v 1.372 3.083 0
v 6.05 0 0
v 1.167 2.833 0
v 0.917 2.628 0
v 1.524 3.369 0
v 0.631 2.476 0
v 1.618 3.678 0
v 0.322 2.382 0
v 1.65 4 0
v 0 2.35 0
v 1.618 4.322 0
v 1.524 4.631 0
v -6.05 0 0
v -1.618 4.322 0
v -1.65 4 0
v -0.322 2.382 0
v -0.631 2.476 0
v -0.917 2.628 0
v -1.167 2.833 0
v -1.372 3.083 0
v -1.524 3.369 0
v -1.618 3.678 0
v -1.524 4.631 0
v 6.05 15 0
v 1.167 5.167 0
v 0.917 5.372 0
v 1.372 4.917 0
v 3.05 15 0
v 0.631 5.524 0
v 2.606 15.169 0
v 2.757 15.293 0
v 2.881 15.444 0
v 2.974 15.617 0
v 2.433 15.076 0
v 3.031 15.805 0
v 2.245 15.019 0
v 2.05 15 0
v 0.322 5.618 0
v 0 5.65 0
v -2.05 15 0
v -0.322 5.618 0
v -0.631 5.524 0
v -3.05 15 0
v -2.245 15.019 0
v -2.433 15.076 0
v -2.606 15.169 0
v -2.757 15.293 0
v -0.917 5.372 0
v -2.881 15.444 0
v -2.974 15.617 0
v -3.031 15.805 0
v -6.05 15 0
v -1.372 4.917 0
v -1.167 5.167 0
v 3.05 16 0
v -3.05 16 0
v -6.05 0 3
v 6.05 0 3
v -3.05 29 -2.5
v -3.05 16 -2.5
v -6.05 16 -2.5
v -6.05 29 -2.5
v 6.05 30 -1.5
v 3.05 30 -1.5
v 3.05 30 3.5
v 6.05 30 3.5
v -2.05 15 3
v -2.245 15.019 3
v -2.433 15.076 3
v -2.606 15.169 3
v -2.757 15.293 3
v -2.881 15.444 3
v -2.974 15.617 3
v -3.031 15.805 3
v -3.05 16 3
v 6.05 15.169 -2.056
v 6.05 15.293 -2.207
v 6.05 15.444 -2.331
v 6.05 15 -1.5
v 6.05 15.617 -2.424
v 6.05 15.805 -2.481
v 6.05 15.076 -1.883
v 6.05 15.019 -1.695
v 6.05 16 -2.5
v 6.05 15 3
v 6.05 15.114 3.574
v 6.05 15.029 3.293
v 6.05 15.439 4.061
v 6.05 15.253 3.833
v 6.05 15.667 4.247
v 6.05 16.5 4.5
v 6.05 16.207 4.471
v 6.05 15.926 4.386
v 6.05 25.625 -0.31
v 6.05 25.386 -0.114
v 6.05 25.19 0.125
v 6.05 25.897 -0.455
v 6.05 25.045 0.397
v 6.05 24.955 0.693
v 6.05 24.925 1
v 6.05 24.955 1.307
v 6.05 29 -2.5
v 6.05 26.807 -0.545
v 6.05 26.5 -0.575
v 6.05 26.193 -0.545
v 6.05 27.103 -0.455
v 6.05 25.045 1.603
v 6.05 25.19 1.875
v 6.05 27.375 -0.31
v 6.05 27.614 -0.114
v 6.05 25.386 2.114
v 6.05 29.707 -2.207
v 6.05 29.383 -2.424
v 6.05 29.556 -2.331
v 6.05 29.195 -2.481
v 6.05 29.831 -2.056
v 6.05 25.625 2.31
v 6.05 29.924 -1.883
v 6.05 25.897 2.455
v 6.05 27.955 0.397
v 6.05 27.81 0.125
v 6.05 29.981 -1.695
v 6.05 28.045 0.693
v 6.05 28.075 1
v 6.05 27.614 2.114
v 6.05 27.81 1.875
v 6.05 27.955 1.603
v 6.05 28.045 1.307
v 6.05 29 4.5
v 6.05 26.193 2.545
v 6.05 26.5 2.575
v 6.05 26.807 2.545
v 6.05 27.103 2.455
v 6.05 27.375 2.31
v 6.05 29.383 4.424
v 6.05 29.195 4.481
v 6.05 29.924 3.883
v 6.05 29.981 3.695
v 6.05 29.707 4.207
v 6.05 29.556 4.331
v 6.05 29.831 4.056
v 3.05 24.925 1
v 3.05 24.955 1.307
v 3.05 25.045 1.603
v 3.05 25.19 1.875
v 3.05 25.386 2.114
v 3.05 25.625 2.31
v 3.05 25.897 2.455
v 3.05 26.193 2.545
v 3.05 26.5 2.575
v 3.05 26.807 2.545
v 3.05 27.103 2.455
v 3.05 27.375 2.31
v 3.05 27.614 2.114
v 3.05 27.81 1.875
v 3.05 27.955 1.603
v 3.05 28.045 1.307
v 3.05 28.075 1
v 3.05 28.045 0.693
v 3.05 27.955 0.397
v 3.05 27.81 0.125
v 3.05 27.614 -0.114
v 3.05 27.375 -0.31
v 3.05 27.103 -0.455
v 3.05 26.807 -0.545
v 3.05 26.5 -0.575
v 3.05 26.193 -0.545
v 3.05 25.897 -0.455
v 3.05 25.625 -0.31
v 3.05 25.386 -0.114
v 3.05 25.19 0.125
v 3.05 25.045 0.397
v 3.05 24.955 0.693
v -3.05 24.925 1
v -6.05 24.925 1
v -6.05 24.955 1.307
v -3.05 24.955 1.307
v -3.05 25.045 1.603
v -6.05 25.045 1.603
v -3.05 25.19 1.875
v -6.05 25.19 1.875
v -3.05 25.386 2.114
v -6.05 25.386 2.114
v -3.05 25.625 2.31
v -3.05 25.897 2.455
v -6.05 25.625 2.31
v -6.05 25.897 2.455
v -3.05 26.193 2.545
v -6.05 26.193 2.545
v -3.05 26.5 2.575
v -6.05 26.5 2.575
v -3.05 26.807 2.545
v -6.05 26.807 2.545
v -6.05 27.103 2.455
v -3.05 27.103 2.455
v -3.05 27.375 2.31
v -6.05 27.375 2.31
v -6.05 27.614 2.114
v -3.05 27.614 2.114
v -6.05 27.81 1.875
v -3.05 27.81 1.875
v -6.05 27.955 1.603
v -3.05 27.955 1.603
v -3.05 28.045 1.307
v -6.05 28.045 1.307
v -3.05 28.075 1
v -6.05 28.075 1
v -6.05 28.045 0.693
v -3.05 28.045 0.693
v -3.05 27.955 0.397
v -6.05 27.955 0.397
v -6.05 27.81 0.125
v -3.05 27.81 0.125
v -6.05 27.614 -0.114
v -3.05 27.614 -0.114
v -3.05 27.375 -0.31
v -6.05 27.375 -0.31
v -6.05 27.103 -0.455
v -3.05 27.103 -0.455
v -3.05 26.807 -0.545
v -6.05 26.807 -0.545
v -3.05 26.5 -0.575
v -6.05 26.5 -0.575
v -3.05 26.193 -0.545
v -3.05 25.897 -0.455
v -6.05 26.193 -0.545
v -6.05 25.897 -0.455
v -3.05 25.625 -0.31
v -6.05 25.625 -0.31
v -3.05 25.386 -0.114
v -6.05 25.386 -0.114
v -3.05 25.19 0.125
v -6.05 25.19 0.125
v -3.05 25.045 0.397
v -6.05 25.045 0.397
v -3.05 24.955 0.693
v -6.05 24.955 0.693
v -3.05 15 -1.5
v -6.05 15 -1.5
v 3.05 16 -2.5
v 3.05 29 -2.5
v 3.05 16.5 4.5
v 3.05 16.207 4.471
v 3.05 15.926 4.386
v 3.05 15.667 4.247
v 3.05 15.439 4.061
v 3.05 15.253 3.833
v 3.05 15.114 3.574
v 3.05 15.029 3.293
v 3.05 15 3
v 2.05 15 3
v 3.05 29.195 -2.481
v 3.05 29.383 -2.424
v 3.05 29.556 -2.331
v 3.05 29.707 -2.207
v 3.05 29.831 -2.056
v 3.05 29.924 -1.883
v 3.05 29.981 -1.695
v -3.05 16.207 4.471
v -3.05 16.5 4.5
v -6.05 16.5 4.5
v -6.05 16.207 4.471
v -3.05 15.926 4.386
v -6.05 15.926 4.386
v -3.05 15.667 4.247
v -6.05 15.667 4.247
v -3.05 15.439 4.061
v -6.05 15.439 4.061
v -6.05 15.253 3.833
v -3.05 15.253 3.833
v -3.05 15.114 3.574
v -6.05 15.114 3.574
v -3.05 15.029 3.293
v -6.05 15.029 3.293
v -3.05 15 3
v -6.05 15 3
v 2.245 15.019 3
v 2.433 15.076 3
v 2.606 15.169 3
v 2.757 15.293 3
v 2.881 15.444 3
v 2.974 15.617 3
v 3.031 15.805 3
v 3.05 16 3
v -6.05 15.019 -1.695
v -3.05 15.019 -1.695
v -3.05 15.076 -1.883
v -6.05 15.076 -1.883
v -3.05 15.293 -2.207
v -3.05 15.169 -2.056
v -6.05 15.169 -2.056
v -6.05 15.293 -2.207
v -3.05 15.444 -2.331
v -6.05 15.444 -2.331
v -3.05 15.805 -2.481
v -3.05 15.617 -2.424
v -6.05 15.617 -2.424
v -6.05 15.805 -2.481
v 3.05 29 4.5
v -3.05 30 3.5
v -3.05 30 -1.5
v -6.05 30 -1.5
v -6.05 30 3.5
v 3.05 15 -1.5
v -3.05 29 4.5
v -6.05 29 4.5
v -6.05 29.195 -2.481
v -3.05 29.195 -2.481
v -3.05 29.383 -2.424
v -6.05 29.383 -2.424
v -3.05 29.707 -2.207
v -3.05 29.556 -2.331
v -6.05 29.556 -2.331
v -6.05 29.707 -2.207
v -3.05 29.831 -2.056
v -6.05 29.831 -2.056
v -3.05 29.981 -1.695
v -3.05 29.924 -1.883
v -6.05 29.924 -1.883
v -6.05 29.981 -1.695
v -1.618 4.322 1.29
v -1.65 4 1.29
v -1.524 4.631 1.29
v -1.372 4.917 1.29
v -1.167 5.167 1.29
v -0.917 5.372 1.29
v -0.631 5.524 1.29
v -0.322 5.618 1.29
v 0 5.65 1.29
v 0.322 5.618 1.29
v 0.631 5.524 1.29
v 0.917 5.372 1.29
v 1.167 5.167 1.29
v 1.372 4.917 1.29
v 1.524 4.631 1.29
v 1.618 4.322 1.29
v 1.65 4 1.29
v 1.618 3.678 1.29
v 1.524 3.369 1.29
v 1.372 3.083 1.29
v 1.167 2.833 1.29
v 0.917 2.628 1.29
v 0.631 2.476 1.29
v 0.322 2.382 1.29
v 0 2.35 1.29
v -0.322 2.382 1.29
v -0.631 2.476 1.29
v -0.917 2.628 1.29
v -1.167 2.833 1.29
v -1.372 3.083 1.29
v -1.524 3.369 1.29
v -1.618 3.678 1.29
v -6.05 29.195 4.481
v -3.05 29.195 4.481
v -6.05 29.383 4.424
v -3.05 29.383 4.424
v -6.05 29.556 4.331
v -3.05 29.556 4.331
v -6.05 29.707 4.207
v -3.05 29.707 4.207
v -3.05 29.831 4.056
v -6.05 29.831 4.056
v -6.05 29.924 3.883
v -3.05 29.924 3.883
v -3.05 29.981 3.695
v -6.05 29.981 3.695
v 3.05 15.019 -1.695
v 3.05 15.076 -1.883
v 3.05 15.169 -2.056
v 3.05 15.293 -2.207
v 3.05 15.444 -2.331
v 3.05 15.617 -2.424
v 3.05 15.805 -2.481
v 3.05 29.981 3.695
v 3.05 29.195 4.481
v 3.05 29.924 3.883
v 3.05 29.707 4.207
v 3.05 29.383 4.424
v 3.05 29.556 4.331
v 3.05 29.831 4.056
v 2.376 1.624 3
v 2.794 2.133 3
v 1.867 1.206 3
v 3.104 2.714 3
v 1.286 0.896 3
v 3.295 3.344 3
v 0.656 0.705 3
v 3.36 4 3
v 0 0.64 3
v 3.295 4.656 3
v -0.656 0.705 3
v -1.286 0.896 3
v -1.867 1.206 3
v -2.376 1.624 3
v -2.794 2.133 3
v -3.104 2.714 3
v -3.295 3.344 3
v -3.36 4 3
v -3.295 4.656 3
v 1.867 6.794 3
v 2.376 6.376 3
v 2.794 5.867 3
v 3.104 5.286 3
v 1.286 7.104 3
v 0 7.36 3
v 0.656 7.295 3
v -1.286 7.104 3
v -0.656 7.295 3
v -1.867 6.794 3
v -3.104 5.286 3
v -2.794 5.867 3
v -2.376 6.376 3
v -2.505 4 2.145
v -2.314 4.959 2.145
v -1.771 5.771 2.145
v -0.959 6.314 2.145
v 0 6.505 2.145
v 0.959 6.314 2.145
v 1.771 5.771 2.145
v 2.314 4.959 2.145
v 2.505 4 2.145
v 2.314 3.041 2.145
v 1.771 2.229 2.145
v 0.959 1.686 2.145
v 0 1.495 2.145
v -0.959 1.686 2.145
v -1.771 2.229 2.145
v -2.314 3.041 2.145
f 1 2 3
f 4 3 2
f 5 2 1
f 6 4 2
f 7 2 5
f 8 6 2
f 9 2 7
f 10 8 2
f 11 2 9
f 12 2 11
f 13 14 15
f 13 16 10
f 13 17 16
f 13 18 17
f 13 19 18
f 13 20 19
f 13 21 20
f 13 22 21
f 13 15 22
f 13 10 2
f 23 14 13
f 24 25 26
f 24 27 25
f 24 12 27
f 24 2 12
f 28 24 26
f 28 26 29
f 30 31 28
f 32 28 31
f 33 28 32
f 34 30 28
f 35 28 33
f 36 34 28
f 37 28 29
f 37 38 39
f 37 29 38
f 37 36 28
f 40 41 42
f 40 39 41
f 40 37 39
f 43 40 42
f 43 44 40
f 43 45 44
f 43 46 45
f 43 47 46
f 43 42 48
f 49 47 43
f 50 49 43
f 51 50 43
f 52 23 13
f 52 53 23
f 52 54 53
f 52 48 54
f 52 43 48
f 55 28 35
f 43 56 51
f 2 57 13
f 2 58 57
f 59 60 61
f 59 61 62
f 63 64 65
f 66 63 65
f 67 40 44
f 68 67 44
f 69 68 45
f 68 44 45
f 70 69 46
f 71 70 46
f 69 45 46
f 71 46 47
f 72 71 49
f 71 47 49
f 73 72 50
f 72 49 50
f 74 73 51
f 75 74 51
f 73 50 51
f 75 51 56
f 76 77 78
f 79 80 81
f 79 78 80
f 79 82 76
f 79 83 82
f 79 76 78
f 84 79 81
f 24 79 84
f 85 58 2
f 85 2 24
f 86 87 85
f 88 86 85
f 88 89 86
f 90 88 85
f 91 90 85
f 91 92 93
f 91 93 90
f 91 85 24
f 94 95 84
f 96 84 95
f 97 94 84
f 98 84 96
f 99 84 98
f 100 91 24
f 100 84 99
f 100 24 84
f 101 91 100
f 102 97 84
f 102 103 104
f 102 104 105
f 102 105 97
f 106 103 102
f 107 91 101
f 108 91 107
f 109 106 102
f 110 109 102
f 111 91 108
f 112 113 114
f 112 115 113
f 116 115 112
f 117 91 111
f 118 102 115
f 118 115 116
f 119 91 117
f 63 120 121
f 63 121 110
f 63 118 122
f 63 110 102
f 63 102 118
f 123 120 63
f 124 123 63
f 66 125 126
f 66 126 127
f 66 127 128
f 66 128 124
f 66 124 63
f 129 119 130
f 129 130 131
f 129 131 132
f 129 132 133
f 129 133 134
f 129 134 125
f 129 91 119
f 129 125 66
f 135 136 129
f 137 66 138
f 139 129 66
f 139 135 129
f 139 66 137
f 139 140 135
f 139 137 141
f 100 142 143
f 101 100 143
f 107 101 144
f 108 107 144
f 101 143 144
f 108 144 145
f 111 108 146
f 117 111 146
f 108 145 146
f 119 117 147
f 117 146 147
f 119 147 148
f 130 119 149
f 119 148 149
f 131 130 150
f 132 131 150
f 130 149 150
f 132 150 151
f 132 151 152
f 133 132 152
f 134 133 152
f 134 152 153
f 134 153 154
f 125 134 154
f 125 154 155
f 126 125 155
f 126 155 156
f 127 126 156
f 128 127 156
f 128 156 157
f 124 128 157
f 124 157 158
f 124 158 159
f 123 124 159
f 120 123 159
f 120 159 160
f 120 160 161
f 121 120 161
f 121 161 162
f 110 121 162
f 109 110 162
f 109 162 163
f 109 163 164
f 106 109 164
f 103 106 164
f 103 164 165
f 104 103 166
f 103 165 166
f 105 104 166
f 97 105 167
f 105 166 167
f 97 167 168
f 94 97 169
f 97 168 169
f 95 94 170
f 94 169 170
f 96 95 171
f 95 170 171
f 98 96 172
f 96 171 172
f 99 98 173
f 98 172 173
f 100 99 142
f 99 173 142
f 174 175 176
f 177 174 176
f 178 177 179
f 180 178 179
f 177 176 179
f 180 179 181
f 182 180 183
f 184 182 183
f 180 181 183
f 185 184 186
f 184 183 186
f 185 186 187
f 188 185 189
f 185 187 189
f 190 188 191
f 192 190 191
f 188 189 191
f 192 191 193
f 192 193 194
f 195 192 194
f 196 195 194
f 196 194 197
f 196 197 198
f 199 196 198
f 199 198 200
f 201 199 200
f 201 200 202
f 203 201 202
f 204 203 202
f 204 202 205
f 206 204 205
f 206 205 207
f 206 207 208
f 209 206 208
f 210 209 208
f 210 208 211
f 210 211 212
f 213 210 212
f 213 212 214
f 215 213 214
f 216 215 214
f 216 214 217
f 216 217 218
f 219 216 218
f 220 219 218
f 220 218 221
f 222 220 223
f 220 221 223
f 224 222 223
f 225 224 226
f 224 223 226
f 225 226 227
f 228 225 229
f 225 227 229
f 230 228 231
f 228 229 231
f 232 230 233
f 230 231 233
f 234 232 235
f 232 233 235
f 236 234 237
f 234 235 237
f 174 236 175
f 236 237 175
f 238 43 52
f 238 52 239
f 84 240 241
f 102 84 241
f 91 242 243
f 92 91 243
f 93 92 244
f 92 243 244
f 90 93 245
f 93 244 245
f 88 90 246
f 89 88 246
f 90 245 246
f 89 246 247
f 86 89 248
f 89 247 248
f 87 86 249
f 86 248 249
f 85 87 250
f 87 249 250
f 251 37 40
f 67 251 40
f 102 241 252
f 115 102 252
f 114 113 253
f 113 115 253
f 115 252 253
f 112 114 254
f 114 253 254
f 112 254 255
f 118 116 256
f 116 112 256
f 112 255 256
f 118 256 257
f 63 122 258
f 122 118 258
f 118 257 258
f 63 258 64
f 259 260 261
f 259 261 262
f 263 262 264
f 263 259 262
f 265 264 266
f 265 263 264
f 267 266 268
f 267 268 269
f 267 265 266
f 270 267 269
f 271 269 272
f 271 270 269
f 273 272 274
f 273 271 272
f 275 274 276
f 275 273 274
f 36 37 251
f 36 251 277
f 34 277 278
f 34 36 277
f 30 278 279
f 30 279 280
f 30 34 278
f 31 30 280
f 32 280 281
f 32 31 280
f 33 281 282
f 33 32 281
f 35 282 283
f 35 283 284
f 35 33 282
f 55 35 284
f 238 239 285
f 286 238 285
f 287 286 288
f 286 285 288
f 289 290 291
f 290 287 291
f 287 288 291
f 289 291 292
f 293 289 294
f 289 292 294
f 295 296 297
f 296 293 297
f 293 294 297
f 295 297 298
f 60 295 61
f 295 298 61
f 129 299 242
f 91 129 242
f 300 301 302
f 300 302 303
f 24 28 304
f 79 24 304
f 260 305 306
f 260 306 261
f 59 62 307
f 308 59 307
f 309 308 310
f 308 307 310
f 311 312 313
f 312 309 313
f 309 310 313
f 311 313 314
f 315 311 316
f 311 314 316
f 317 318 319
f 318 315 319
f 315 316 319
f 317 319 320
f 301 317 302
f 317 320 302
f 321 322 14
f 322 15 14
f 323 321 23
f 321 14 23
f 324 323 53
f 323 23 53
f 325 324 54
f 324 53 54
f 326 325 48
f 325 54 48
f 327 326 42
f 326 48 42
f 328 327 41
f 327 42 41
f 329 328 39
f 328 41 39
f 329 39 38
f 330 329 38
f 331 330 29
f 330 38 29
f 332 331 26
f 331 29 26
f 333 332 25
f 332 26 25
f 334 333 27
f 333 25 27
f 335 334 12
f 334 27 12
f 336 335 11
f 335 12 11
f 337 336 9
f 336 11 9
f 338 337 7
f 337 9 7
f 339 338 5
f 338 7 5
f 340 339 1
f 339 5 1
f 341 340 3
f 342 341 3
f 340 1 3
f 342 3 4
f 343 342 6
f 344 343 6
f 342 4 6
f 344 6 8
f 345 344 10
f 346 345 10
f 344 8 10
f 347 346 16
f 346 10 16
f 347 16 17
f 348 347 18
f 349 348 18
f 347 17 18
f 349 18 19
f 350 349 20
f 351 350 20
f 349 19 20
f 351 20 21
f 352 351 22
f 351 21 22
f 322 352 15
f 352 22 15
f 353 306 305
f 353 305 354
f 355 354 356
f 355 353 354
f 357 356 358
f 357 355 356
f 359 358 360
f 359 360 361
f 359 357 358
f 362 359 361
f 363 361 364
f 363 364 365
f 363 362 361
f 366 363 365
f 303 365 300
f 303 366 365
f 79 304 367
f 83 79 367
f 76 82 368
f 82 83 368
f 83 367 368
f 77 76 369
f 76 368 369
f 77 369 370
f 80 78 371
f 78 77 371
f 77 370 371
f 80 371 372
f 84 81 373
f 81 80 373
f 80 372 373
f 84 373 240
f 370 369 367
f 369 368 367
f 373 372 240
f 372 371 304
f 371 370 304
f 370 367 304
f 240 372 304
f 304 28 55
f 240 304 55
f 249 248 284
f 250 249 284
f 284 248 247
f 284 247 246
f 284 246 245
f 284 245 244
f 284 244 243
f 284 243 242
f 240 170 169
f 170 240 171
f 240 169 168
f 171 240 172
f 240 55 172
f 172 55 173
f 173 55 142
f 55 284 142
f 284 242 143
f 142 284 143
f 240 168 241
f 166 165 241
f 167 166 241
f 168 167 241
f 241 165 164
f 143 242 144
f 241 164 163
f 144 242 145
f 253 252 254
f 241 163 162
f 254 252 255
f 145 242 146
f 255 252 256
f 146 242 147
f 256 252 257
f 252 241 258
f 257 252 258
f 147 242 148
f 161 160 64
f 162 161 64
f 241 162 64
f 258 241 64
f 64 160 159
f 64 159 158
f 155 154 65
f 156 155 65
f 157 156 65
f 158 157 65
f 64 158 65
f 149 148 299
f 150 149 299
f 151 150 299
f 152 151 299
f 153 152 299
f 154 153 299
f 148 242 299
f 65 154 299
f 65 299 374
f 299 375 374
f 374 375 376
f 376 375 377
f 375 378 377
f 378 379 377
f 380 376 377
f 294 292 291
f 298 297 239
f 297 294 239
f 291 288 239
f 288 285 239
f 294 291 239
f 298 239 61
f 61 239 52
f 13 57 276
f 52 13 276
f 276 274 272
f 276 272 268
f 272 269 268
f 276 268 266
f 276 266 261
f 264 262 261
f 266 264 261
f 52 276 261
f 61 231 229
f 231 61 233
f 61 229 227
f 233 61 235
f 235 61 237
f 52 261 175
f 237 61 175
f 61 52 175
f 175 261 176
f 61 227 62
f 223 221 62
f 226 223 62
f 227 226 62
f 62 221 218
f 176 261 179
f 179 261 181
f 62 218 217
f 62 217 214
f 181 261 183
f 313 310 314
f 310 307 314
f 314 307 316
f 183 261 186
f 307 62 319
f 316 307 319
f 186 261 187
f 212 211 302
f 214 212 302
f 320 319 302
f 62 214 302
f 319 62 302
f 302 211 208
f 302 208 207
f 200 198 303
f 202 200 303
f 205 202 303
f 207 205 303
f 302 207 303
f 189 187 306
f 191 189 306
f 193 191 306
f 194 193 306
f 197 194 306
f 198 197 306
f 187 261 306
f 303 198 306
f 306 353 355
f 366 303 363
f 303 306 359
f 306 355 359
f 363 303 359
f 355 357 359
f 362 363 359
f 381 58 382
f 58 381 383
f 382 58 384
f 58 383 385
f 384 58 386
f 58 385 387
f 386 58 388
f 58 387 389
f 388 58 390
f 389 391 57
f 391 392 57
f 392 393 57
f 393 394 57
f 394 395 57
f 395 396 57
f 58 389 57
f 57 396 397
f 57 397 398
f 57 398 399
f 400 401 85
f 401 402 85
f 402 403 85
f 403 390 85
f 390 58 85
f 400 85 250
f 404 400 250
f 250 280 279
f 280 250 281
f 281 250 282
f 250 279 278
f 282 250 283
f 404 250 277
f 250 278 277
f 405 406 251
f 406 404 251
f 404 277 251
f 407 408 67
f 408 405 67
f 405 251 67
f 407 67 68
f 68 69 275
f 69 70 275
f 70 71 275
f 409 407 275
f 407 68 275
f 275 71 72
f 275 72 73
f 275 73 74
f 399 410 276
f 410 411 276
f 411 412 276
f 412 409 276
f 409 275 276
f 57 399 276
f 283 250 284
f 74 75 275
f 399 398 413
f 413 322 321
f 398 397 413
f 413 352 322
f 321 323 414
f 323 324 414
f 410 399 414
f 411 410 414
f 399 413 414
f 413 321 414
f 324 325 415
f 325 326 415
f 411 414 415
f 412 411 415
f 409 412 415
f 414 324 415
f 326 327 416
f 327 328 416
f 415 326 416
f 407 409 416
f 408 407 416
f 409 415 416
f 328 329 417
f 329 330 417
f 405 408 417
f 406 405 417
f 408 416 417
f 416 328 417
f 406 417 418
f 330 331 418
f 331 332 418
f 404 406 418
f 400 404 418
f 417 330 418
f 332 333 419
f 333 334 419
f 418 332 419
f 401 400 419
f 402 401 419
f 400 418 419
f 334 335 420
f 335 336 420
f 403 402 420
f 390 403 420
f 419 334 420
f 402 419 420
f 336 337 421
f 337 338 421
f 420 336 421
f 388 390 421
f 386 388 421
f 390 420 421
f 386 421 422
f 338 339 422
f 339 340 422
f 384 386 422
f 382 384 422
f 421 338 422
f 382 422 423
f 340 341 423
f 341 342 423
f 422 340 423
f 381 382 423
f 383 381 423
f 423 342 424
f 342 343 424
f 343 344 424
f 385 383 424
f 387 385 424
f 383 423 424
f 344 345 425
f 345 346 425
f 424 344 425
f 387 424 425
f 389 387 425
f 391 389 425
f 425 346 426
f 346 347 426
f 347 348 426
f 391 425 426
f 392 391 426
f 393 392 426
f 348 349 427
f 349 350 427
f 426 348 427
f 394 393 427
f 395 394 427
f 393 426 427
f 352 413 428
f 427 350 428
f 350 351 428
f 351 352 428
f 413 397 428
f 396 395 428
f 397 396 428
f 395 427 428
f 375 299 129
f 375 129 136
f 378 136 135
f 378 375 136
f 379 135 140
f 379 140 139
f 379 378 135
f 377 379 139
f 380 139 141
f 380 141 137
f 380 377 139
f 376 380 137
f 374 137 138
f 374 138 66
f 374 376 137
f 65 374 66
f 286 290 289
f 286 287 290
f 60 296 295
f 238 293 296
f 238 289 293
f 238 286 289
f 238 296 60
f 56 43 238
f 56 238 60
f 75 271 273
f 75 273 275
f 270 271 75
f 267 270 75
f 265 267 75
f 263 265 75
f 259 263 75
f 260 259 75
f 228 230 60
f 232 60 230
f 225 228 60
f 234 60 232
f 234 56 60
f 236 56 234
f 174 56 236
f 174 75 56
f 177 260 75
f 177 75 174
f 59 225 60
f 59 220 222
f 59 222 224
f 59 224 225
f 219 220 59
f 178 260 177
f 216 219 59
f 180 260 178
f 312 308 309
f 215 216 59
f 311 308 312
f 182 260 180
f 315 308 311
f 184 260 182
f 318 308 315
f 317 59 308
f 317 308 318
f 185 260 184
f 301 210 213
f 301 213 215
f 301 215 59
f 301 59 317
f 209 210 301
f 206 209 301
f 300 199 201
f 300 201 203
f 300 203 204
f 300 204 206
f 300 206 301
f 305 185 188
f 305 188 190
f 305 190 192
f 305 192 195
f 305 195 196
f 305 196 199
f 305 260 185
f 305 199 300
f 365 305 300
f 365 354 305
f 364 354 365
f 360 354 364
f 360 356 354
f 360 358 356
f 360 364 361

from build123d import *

# Parameters (mm, degrees)
F0_W           = 3.05
F0_H           = 15
F1_DEPTH       = 3
F3_DEPTH       = 3
F6_D           = 3.3
F6_CSINK_D     = 6.72
F6_CSINK_ANGLE = 90
F8_D           = 3.15
F9_T1_DEPTH    = 3
F9_T3_DEPTH    = 8
F9_T5_DEPTH    = 8


# Not quite as in the source:
# - a fillet or chamfer that OpenCascade refuses, or shapes differently, is made with other operations: its cross-section is extruded or revolved along the edge and cut away or added


with BuildPart() as f1:
    # F0 (on Top) → F1 (new body)
    with BuildSketch(Plane.XY):
        with Locations((1.525, 7.5)):
            Rectangle(F0_W, F0_H)
    extrude(amount=F1_DEPTH)

    # F2 (on face) → F3 (join)
    with BuildSketch(Plane.YZ.offset(3.05)):
        with BuildLine():
            Line((0, 3), (0, 0))
            Line((0, 0), (15, 0))
            Line((15, 0), (15, -2.5))
            Line((15, -2.5), (30, -2.5))
            Line((30, -2.5), (30, 4.5))
            Line((30, 4.5), (16.5, 4.5))
            ThreePointArc((16.5, 4.5), (15.4393398282, 4.0606601718), (15, 3))
            Line((15, 3), (0, 3))
        make_face()
    extrude(amount=F3_DEPTH)

    # F4: F1 across face


with BuildPart() as f1_1:
    add(f1.part)
    add(f1.part.mirror(Plane(origin=(0, 7.5, 1.5), x_dir=(0, -1, 0), z_dir=(-1, 0, 0))))

    # F6 (through all)
    with Locations(Plane.XY.offset(3)):
        with Locations((0, 4)):
            CounterSinkHole(F6_D / 2, F6_CSINK_D / 2, counter_sink_angle=F6_CSINK_ANGLE)

    # F8 (through all)
    with Locations(Plane.YZ.offset(6.05)):
        with Locations((26.5, 1)):
            Hole(F8_D / 2)

    # F9: fillet of radius 1 on 8 edges, made by hand

    # F9_s2 → F9_t1 (join)
    with BuildSketch(Plane.XY):
        with BuildLine():
            ThreePointArc((2.05, 15), (2.7571067812, 15.2928932188), (3.05, 16))
            Line((3.05, 16), (3.05, 15))
            Line((3.05, 15), (2.05, 15))
        make_face()
        with BuildLine():
            ThreePointArc((-2.05, 15), (-2.7571067812, 15.2928932188), (-3.05, 16))
            Line((-3.05, 16), (-3.05, 15))
            Line((-3.05, 15), (-2.05, 15))
        make_face()
    extrude(amount=F9_T1_DEPTH)

    # F9_s4 → F9_t3 (cut)
    with BuildSketch(Plane.YZ.offset(0.55)):
        with BuildLine():
            ThreePointArc((29, 4.5), (29.7071067812, 4.2071067812), (30, 3.5))
            Line((30, 3.5), (30, 4.5))
            Line((30, 4.5), (29, 4.5))
        make_face()
        with BuildLine():
            ThreePointArc((29, -2.5), (29.7071067812, -2.2071067812), (30, -1.5))
            Line((30, -1.5), (30, -2.5))
            Line((30, -2.5), (29, -2.5))
        make_face()
        with BuildLine():
            ThreePointArc((15, -1.5), (15.2928932188, -2.2071067812), (16, -2.5))
            Line((16, -2.5), (15, -2.5))
            Line((15, -2.5), (15, -1.5))
        make_face()
    extrude(amount=F9_T3_DEPTH, mode=Mode.SUBTRACT)

    # F9_s6 → F9_t5 (cut)
    with BuildSketch(Plane.YZ.offset(-8.55)):
        with BuildLine():
            ThreePointArc((29, 4.5), (29.7071067812, 4.2071067812), (30, 3.5))
            Line((30, 3.5), (30, 4.5))
            Line((30, 4.5), (29, 4.5))
        make_face()
        with BuildLine():
            ThreePointArc((29, -2.5), (29.7071067812, -2.2071067812), (30, -1.5))
            Line((30, -1.5), (30, -2.5))
            Line((30, -2.5), (29, -2.5))
        make_face()
        with BuildLine():
            ThreePointArc((15, -1.5), (15.2928932188, -2.2071067812), (16, -2.5))
            Line((16, -2.5), (15, -2.5))
            Line((15, -2.5), (15, -1.5))
        make_face()
    extrude(amount=F9_T5_DEPTH, mode=Mode.SUBTRACT)


solid = f1_1.part
